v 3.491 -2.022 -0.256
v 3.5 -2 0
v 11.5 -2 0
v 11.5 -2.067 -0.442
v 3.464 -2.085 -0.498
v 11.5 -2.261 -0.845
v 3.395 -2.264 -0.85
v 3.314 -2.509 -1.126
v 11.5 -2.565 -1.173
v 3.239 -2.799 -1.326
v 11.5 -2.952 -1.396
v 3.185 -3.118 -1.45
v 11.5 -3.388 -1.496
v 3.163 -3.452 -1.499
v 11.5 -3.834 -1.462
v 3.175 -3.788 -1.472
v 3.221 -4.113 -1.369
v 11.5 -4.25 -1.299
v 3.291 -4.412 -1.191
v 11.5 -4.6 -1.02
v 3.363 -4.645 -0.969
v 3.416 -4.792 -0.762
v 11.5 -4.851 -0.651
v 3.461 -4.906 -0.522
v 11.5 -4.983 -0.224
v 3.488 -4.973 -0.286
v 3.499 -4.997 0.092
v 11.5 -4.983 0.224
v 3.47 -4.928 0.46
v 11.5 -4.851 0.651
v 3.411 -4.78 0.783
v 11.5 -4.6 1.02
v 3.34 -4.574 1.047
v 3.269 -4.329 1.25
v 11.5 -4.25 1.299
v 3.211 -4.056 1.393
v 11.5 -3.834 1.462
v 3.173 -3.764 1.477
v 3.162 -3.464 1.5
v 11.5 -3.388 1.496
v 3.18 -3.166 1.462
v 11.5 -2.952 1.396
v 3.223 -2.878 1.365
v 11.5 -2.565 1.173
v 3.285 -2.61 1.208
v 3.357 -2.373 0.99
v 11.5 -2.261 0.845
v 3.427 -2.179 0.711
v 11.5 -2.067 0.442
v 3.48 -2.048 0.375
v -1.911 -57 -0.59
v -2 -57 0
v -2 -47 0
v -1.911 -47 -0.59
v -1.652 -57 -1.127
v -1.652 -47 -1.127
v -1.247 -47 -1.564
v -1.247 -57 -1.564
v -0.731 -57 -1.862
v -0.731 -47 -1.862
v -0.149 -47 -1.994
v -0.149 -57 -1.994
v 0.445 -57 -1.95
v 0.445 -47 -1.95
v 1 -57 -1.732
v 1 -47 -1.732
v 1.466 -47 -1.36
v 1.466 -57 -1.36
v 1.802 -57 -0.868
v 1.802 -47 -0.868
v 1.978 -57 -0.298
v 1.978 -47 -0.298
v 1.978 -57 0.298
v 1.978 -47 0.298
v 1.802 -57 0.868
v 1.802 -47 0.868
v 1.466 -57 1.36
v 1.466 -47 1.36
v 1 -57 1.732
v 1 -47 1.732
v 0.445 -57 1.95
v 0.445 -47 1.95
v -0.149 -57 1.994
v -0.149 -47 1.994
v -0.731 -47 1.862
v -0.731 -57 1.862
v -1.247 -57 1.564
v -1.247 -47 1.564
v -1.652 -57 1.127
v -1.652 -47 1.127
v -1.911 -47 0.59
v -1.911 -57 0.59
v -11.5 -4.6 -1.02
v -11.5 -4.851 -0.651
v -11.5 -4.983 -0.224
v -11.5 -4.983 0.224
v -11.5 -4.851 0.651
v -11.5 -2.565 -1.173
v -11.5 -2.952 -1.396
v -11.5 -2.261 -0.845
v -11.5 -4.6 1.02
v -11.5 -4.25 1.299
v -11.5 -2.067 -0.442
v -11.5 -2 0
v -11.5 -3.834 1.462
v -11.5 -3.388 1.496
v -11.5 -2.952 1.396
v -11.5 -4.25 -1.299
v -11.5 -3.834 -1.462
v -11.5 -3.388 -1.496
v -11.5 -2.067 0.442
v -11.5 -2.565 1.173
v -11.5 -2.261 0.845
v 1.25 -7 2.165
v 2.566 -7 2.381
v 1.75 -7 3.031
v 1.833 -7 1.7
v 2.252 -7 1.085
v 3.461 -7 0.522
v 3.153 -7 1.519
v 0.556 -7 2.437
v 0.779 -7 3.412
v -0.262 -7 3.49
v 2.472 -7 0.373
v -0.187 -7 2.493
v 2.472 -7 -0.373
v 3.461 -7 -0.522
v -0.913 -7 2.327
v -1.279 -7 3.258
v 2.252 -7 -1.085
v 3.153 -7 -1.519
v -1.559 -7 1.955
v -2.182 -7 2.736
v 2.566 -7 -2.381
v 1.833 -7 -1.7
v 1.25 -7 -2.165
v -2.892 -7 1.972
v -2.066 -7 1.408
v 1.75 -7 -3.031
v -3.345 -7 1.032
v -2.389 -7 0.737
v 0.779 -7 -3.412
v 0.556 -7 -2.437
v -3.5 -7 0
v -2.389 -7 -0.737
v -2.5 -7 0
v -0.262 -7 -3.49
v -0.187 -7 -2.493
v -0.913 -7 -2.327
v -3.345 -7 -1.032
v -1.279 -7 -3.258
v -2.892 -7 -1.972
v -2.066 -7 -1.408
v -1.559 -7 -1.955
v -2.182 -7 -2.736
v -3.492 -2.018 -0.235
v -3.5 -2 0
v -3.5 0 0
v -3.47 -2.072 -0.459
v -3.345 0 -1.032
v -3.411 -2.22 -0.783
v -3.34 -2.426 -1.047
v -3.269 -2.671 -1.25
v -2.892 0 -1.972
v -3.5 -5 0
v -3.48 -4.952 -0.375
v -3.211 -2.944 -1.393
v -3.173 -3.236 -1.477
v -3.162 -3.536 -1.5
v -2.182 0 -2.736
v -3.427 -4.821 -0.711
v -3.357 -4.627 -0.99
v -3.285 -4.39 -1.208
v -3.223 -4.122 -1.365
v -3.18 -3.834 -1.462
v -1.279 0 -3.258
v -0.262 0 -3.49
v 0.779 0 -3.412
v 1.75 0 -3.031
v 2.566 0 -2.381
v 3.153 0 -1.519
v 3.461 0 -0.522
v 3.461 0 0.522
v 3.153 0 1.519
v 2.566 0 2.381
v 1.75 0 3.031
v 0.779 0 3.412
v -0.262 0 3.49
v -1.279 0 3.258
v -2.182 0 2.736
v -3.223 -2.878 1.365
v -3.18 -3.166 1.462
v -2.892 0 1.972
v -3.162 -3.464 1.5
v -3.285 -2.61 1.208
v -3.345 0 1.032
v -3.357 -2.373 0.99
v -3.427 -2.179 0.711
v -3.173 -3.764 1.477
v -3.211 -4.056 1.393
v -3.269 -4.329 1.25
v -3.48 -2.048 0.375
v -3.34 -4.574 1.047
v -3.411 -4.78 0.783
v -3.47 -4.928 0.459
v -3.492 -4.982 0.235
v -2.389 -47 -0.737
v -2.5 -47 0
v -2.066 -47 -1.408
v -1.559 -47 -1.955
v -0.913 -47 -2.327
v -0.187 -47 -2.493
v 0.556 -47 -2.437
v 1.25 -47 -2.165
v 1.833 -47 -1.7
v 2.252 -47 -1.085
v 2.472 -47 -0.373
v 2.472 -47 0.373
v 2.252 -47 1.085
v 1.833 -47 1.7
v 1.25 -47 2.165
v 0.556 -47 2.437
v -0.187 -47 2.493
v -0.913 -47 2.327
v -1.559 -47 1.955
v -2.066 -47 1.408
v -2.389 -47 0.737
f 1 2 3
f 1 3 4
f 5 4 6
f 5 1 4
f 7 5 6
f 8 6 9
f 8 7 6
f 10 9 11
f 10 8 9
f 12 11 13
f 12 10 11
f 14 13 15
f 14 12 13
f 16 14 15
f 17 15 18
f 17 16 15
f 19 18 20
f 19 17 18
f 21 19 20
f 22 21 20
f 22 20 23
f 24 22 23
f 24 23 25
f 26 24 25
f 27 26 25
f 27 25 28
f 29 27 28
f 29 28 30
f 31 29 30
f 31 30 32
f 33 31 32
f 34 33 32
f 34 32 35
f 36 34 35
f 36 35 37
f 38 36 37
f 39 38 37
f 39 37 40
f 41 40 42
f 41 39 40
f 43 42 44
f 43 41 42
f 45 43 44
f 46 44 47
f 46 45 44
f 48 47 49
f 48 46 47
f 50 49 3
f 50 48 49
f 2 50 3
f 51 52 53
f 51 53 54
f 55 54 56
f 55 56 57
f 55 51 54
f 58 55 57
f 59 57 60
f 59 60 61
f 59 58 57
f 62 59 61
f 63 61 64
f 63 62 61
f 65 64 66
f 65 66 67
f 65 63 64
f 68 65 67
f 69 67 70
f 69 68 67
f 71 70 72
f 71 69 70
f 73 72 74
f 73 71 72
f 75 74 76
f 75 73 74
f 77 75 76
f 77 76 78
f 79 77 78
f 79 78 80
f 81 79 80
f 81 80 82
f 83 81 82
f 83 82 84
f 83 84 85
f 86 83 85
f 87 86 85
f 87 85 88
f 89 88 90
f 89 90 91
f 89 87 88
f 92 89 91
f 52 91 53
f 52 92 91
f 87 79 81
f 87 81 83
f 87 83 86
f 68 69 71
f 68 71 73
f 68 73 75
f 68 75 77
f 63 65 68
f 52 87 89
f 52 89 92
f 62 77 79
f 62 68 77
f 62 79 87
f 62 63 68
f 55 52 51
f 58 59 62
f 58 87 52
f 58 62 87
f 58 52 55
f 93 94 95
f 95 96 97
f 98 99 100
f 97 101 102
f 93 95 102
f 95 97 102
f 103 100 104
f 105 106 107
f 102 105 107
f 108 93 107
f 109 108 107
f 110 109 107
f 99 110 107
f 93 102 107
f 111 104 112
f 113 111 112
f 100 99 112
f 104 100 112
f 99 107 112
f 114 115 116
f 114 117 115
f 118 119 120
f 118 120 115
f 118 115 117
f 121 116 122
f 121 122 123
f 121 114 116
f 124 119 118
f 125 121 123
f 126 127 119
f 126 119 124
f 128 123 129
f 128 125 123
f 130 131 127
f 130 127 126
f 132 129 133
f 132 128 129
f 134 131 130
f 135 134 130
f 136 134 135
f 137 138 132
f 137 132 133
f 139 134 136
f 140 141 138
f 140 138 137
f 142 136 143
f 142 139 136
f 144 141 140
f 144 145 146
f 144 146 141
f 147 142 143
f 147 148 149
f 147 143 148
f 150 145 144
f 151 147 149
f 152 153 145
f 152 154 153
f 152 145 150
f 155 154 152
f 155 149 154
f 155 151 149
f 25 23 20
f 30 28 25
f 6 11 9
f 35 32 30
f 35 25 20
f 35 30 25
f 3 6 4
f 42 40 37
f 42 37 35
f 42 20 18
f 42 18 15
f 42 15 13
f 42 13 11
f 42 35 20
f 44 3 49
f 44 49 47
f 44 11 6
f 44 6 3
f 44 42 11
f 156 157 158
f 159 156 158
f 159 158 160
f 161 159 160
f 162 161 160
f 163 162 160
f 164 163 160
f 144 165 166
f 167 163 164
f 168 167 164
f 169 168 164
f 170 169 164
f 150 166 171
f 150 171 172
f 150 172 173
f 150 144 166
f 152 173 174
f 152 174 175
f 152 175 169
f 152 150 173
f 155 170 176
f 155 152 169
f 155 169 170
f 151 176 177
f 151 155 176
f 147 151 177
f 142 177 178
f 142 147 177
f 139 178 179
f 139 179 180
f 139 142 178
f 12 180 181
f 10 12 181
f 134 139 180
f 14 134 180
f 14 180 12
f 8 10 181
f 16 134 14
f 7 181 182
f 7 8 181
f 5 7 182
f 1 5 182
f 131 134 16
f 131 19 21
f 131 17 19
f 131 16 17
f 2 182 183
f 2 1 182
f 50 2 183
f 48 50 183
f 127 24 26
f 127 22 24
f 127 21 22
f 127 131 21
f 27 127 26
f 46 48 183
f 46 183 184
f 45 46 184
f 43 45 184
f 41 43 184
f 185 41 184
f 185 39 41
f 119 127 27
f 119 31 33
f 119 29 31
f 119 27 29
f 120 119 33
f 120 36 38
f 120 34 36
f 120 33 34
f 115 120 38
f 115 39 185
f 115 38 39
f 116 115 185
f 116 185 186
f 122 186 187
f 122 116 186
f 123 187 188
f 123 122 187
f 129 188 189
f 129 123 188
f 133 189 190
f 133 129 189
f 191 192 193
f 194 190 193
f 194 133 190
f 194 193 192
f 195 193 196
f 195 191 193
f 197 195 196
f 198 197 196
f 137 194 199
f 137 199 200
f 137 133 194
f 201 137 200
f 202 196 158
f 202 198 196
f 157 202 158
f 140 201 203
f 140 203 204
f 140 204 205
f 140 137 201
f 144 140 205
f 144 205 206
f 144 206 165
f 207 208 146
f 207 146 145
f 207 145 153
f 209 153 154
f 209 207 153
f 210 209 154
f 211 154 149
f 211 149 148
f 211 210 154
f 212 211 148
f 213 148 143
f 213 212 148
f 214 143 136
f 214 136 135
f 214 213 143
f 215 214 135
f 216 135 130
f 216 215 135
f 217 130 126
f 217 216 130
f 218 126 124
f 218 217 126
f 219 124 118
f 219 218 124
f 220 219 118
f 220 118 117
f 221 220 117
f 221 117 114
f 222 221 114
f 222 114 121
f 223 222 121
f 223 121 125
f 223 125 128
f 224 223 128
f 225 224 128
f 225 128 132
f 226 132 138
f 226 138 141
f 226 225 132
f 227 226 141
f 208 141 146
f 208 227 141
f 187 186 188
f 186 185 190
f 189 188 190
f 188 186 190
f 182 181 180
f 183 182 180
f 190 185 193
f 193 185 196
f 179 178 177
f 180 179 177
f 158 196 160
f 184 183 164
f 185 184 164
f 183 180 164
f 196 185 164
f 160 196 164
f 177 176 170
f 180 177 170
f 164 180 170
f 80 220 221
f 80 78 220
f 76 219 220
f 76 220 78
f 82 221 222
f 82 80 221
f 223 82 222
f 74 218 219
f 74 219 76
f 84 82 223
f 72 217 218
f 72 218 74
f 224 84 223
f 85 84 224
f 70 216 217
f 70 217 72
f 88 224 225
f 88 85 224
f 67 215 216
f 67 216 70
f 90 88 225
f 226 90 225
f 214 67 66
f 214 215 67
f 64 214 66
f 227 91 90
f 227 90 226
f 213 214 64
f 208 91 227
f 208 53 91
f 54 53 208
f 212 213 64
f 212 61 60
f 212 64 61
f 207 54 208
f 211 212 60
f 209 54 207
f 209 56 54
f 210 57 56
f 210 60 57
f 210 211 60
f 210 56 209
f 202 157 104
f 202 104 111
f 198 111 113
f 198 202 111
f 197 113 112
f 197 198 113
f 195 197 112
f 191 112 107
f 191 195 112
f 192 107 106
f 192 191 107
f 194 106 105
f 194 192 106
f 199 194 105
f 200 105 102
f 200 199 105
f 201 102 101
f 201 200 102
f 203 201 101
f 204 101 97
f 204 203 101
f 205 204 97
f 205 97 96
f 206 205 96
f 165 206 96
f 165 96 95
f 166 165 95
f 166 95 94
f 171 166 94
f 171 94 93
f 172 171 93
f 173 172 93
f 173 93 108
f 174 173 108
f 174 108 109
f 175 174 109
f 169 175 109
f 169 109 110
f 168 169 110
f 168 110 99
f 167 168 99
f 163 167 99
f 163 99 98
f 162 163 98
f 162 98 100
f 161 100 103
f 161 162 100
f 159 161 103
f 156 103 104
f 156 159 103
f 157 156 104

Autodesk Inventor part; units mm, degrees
ref_plane "YZ Plane" through (0, 0, 0) normal (1, 0, 0) x (0, 1, 0)
ref_plane "XZ Plane" through (0, 0, 0) normal (0, 1, 0) x (-1, 0, 0)
ref_plane "XY Plane" through (0, 0, 0) normal (0, 0, 1) x (1, 0, 0)
sketch "Sketch1" plane through (0, 0, 0) normal (0, 0, 1) x (1, 0, 0)
  line L0 (-2.5, -7) -> (-2.5, -47)
  line L1 (-3.5, 0) -> (-3.5, -7)
  line L2 (-3.5, -7) -> (-2.5, -7)
  line L3 (-2, -47) -> (-2, -57)
  line L4 (-2.5, -47) -> (-2, -47)
  line L5 (-2, -57) -> (0, -57)
  line L6 (-3.5, 0) -> (0, 0)
  line L7 (0, 0) -> (0, -59)
  dimension "d1" = 7
  dimension "d3" = 40
  dimension "d5" = 10
revolve "Revolution1" add sketch "Sketch1" angle 360 about axis through (0, 0, 0) along (0, -1, 0)
thread "Thread1" size "M5x0.8" class "6g" standard "ANSI Metric M Profile" length 11
sketch "Sketch2" plane through (0, 0, 0) normal (1, 0, 0) x (0, 1, 0)
  line L0 (-7, 3.5) -> (-7, -3.5) projected
  line L1 (0, 3.5) -> (0, -3.5) projected
  circle A0 centre (-3.5, 0) radius 1.5
  point P0 (0, 0)
  dimension "d11" = 3
  dimension "d12" = 3.5
  dimension "d13" = 3.5
extrude "Extrusion1" add sketch "Sketch2" along normal mid plane 23
properties part number "HUDSON-1-84"
